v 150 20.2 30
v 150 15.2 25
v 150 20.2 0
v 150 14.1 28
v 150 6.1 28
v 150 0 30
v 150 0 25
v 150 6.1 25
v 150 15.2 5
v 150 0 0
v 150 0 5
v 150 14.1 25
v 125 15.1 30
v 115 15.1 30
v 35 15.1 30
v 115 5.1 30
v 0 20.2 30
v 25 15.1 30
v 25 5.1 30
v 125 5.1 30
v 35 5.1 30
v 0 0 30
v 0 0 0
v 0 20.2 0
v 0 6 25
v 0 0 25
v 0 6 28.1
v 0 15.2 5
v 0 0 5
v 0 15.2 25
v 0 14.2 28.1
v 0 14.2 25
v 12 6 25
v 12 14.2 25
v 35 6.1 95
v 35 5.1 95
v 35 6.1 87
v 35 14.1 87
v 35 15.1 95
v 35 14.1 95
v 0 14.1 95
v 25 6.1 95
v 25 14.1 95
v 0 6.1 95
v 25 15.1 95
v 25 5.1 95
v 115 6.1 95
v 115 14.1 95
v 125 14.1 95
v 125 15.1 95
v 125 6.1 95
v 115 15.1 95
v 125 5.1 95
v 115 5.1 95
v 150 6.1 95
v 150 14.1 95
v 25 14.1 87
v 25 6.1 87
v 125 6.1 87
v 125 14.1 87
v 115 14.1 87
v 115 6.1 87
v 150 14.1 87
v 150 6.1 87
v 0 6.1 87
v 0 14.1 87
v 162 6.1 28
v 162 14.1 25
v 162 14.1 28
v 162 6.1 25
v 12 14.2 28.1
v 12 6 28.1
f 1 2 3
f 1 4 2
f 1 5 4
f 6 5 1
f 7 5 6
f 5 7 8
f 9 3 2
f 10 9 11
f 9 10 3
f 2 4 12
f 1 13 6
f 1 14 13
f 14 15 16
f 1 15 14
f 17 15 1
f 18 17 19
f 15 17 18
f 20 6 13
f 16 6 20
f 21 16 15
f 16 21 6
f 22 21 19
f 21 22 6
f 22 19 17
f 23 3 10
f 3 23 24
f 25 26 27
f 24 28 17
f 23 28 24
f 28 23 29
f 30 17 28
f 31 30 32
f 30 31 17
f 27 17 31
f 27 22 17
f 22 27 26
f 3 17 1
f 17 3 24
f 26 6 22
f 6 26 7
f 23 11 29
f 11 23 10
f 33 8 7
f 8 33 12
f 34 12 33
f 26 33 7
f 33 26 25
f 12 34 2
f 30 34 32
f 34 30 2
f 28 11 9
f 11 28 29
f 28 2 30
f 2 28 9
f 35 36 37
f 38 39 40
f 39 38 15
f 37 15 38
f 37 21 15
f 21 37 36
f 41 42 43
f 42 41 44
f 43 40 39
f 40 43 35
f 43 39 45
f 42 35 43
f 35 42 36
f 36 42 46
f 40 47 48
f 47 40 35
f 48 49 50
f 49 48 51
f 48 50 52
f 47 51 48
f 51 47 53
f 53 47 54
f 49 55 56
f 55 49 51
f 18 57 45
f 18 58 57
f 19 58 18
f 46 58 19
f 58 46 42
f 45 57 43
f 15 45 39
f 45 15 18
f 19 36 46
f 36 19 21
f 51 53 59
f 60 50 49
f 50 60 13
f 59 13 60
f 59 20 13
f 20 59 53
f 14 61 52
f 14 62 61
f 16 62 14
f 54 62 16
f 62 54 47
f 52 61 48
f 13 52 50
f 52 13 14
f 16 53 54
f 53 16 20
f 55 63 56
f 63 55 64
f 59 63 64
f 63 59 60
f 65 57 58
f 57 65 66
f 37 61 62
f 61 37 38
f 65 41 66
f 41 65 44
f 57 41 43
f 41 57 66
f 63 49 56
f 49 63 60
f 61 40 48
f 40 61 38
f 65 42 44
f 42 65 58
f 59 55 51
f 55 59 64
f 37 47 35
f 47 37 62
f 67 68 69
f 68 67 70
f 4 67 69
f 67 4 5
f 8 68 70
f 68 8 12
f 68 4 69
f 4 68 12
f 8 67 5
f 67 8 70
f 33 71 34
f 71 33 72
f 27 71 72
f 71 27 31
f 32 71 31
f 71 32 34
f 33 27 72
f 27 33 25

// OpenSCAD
// file: ../../common/utils.scad
// Common utilities and shared variables
// Include this file at the top of your models:
//   include <../../common/utils.scad>

// ── Units ────────────────────────────────────────────────────────────────────
// All dimensions in millimeters

// ── Print tolerances ─────────────────────────────────────────────────────────
// Gap to add when two parts need to fit together (e.g., peg into a hole)
FIT_CLEARANCE = 0.2;  // mm

// Tolerance for press-fit / tight connections
PRESS_FIT = 0.1;  // mm

// ── Quality settings ─────────────────────────────────────────────────────────
// Override per-model if needed
$fn = $preview ? 32 : 128;  // Circle/sphere resolution

// ── Common layer heights ──────────────────────────────────────────────────────
LAYER_HEIGHT      = 0.2;   // standard
FIRST_LAYER       = 0.3;   // slightly thicker first layer
MIN_WALL          = 0.4;   // single extrusion width (0.4 mm nozzle)
// main file
// Dog ramp side railing — modular fence segments
// The C-clamp slides onto the ramp's side board horizontally from the
// outside — no vertical clearance needed. Two arms grip the board above
// and below; the slot opens outward (Y=0 face). Place segments end-to-end
// along each long edge; adjacent segments interlock via a flat tab-and-socket.
//
// BEFORE PRINTING: measure the side-board thickness and update board_t,
// or override on the command line:
//   openscad -D "board_t=18" -o ramp-railing.stl ramp-railing.scad
//
// Print orientation: flat on bed (Z-up), no supports required.
//
// Render:
//   openscad -o ramp-railing.stl ramp-railing.scad

include <../../common/utils.scad>

// ── Parameters ────────────────────────────────────────────────────────────────

board_t    = 15;   // ramp side-board thickness — MEASURE AND UPDATE (mm)
board_grip = 20;   // height of board section gripped by the two arms (mm)
segment_l  = 150;  // length of one printed segment (mm)
post_h     = 65;   // post height above the ramp surface (mm)
post_sq    = 10;   // post cross-section side (mm)
rail_h     =  8;   // top-rail height (mm)
rail_d     =  8;   // top-rail depth (mm)
wall       =  5;   // arm and back-wall thickness (mm)
tab_l      = 12;   // segment connector tab protrusion length (mm)
tab_h      =  3;   // segment connector tab thickness (mm)

// ── Derived ───────────────────────────────────────────────────────────────────

slot_depth = board_t + FIT_CLEARANCE;   // slot depth in Y (board slides in)
outer_y    = slot_depth + wall;         // total clamp depth: open slot + back wall
clamp_h    = 2 * wall + board_grip;     // total height: bottom arm + slot + top arm
z_surf     = clamp_h;                   // Z level of the ramp surface

post_xa = segment_l * 0.2;
post_xb = segment_l * 0.8;

// ── Modules ───────────────────────────────────────────────────────────────────

// C-clamp body. Slot opens at Y=0 (outer face, facing the installer).
// Back wall at Y=slot_depth..outer_y presses against the board's inner face.
// Upper arm bridges across the slot at Z=wall+board_grip — no supports needed.
module clamp_body() {
    difference() {
        cube([segment_l, outer_y, clamp_h]);
        translate([0, 0, wall])
            cube([segment_l, slot_depth, board_grip]);
    }
}

module post(x_pos) {
    translate([x_pos - post_sq / 2, (outer_y - post_sq) / 2, z_surf])
        cube([post_sq, post_sq, post_h]);
}

module top_rail() {
    translate([0, (outer_y - rail_d) / 2, z_surf + post_h - rail_h])
        cube([segment_l, rail_d, rail_h]);
}

// Male tab protrudes from +X end face, in the solid upper-arm zone.
module tab_male() {
    translate([segment_l, (outer_y - rail_d) / 2, clamp_h - wall])
        cube([tab_l, rail_d, tab_h]);
}

// Female socket cut into -X end face; receives male tab of adjacent segment.
module tab_female() {
    translate([0,
               (outer_y - rail_d) / 2 - FIT_CLEARANCE / 2,
               clamp_h - wall - FIT_CLEARANCE / 2])
        cube([tab_l, rail_d + FIT_CLEARANCE, tab_h + FIT_CLEARANCE]);
}

// ── Main ──────────────────────────────────────────────────────────────────────

difference() {
    union() {
        clamp_body();
        post(post_xa);
        post(post_xb);
        top_rail();
        tab_male();
    }
    tab_female();
}
